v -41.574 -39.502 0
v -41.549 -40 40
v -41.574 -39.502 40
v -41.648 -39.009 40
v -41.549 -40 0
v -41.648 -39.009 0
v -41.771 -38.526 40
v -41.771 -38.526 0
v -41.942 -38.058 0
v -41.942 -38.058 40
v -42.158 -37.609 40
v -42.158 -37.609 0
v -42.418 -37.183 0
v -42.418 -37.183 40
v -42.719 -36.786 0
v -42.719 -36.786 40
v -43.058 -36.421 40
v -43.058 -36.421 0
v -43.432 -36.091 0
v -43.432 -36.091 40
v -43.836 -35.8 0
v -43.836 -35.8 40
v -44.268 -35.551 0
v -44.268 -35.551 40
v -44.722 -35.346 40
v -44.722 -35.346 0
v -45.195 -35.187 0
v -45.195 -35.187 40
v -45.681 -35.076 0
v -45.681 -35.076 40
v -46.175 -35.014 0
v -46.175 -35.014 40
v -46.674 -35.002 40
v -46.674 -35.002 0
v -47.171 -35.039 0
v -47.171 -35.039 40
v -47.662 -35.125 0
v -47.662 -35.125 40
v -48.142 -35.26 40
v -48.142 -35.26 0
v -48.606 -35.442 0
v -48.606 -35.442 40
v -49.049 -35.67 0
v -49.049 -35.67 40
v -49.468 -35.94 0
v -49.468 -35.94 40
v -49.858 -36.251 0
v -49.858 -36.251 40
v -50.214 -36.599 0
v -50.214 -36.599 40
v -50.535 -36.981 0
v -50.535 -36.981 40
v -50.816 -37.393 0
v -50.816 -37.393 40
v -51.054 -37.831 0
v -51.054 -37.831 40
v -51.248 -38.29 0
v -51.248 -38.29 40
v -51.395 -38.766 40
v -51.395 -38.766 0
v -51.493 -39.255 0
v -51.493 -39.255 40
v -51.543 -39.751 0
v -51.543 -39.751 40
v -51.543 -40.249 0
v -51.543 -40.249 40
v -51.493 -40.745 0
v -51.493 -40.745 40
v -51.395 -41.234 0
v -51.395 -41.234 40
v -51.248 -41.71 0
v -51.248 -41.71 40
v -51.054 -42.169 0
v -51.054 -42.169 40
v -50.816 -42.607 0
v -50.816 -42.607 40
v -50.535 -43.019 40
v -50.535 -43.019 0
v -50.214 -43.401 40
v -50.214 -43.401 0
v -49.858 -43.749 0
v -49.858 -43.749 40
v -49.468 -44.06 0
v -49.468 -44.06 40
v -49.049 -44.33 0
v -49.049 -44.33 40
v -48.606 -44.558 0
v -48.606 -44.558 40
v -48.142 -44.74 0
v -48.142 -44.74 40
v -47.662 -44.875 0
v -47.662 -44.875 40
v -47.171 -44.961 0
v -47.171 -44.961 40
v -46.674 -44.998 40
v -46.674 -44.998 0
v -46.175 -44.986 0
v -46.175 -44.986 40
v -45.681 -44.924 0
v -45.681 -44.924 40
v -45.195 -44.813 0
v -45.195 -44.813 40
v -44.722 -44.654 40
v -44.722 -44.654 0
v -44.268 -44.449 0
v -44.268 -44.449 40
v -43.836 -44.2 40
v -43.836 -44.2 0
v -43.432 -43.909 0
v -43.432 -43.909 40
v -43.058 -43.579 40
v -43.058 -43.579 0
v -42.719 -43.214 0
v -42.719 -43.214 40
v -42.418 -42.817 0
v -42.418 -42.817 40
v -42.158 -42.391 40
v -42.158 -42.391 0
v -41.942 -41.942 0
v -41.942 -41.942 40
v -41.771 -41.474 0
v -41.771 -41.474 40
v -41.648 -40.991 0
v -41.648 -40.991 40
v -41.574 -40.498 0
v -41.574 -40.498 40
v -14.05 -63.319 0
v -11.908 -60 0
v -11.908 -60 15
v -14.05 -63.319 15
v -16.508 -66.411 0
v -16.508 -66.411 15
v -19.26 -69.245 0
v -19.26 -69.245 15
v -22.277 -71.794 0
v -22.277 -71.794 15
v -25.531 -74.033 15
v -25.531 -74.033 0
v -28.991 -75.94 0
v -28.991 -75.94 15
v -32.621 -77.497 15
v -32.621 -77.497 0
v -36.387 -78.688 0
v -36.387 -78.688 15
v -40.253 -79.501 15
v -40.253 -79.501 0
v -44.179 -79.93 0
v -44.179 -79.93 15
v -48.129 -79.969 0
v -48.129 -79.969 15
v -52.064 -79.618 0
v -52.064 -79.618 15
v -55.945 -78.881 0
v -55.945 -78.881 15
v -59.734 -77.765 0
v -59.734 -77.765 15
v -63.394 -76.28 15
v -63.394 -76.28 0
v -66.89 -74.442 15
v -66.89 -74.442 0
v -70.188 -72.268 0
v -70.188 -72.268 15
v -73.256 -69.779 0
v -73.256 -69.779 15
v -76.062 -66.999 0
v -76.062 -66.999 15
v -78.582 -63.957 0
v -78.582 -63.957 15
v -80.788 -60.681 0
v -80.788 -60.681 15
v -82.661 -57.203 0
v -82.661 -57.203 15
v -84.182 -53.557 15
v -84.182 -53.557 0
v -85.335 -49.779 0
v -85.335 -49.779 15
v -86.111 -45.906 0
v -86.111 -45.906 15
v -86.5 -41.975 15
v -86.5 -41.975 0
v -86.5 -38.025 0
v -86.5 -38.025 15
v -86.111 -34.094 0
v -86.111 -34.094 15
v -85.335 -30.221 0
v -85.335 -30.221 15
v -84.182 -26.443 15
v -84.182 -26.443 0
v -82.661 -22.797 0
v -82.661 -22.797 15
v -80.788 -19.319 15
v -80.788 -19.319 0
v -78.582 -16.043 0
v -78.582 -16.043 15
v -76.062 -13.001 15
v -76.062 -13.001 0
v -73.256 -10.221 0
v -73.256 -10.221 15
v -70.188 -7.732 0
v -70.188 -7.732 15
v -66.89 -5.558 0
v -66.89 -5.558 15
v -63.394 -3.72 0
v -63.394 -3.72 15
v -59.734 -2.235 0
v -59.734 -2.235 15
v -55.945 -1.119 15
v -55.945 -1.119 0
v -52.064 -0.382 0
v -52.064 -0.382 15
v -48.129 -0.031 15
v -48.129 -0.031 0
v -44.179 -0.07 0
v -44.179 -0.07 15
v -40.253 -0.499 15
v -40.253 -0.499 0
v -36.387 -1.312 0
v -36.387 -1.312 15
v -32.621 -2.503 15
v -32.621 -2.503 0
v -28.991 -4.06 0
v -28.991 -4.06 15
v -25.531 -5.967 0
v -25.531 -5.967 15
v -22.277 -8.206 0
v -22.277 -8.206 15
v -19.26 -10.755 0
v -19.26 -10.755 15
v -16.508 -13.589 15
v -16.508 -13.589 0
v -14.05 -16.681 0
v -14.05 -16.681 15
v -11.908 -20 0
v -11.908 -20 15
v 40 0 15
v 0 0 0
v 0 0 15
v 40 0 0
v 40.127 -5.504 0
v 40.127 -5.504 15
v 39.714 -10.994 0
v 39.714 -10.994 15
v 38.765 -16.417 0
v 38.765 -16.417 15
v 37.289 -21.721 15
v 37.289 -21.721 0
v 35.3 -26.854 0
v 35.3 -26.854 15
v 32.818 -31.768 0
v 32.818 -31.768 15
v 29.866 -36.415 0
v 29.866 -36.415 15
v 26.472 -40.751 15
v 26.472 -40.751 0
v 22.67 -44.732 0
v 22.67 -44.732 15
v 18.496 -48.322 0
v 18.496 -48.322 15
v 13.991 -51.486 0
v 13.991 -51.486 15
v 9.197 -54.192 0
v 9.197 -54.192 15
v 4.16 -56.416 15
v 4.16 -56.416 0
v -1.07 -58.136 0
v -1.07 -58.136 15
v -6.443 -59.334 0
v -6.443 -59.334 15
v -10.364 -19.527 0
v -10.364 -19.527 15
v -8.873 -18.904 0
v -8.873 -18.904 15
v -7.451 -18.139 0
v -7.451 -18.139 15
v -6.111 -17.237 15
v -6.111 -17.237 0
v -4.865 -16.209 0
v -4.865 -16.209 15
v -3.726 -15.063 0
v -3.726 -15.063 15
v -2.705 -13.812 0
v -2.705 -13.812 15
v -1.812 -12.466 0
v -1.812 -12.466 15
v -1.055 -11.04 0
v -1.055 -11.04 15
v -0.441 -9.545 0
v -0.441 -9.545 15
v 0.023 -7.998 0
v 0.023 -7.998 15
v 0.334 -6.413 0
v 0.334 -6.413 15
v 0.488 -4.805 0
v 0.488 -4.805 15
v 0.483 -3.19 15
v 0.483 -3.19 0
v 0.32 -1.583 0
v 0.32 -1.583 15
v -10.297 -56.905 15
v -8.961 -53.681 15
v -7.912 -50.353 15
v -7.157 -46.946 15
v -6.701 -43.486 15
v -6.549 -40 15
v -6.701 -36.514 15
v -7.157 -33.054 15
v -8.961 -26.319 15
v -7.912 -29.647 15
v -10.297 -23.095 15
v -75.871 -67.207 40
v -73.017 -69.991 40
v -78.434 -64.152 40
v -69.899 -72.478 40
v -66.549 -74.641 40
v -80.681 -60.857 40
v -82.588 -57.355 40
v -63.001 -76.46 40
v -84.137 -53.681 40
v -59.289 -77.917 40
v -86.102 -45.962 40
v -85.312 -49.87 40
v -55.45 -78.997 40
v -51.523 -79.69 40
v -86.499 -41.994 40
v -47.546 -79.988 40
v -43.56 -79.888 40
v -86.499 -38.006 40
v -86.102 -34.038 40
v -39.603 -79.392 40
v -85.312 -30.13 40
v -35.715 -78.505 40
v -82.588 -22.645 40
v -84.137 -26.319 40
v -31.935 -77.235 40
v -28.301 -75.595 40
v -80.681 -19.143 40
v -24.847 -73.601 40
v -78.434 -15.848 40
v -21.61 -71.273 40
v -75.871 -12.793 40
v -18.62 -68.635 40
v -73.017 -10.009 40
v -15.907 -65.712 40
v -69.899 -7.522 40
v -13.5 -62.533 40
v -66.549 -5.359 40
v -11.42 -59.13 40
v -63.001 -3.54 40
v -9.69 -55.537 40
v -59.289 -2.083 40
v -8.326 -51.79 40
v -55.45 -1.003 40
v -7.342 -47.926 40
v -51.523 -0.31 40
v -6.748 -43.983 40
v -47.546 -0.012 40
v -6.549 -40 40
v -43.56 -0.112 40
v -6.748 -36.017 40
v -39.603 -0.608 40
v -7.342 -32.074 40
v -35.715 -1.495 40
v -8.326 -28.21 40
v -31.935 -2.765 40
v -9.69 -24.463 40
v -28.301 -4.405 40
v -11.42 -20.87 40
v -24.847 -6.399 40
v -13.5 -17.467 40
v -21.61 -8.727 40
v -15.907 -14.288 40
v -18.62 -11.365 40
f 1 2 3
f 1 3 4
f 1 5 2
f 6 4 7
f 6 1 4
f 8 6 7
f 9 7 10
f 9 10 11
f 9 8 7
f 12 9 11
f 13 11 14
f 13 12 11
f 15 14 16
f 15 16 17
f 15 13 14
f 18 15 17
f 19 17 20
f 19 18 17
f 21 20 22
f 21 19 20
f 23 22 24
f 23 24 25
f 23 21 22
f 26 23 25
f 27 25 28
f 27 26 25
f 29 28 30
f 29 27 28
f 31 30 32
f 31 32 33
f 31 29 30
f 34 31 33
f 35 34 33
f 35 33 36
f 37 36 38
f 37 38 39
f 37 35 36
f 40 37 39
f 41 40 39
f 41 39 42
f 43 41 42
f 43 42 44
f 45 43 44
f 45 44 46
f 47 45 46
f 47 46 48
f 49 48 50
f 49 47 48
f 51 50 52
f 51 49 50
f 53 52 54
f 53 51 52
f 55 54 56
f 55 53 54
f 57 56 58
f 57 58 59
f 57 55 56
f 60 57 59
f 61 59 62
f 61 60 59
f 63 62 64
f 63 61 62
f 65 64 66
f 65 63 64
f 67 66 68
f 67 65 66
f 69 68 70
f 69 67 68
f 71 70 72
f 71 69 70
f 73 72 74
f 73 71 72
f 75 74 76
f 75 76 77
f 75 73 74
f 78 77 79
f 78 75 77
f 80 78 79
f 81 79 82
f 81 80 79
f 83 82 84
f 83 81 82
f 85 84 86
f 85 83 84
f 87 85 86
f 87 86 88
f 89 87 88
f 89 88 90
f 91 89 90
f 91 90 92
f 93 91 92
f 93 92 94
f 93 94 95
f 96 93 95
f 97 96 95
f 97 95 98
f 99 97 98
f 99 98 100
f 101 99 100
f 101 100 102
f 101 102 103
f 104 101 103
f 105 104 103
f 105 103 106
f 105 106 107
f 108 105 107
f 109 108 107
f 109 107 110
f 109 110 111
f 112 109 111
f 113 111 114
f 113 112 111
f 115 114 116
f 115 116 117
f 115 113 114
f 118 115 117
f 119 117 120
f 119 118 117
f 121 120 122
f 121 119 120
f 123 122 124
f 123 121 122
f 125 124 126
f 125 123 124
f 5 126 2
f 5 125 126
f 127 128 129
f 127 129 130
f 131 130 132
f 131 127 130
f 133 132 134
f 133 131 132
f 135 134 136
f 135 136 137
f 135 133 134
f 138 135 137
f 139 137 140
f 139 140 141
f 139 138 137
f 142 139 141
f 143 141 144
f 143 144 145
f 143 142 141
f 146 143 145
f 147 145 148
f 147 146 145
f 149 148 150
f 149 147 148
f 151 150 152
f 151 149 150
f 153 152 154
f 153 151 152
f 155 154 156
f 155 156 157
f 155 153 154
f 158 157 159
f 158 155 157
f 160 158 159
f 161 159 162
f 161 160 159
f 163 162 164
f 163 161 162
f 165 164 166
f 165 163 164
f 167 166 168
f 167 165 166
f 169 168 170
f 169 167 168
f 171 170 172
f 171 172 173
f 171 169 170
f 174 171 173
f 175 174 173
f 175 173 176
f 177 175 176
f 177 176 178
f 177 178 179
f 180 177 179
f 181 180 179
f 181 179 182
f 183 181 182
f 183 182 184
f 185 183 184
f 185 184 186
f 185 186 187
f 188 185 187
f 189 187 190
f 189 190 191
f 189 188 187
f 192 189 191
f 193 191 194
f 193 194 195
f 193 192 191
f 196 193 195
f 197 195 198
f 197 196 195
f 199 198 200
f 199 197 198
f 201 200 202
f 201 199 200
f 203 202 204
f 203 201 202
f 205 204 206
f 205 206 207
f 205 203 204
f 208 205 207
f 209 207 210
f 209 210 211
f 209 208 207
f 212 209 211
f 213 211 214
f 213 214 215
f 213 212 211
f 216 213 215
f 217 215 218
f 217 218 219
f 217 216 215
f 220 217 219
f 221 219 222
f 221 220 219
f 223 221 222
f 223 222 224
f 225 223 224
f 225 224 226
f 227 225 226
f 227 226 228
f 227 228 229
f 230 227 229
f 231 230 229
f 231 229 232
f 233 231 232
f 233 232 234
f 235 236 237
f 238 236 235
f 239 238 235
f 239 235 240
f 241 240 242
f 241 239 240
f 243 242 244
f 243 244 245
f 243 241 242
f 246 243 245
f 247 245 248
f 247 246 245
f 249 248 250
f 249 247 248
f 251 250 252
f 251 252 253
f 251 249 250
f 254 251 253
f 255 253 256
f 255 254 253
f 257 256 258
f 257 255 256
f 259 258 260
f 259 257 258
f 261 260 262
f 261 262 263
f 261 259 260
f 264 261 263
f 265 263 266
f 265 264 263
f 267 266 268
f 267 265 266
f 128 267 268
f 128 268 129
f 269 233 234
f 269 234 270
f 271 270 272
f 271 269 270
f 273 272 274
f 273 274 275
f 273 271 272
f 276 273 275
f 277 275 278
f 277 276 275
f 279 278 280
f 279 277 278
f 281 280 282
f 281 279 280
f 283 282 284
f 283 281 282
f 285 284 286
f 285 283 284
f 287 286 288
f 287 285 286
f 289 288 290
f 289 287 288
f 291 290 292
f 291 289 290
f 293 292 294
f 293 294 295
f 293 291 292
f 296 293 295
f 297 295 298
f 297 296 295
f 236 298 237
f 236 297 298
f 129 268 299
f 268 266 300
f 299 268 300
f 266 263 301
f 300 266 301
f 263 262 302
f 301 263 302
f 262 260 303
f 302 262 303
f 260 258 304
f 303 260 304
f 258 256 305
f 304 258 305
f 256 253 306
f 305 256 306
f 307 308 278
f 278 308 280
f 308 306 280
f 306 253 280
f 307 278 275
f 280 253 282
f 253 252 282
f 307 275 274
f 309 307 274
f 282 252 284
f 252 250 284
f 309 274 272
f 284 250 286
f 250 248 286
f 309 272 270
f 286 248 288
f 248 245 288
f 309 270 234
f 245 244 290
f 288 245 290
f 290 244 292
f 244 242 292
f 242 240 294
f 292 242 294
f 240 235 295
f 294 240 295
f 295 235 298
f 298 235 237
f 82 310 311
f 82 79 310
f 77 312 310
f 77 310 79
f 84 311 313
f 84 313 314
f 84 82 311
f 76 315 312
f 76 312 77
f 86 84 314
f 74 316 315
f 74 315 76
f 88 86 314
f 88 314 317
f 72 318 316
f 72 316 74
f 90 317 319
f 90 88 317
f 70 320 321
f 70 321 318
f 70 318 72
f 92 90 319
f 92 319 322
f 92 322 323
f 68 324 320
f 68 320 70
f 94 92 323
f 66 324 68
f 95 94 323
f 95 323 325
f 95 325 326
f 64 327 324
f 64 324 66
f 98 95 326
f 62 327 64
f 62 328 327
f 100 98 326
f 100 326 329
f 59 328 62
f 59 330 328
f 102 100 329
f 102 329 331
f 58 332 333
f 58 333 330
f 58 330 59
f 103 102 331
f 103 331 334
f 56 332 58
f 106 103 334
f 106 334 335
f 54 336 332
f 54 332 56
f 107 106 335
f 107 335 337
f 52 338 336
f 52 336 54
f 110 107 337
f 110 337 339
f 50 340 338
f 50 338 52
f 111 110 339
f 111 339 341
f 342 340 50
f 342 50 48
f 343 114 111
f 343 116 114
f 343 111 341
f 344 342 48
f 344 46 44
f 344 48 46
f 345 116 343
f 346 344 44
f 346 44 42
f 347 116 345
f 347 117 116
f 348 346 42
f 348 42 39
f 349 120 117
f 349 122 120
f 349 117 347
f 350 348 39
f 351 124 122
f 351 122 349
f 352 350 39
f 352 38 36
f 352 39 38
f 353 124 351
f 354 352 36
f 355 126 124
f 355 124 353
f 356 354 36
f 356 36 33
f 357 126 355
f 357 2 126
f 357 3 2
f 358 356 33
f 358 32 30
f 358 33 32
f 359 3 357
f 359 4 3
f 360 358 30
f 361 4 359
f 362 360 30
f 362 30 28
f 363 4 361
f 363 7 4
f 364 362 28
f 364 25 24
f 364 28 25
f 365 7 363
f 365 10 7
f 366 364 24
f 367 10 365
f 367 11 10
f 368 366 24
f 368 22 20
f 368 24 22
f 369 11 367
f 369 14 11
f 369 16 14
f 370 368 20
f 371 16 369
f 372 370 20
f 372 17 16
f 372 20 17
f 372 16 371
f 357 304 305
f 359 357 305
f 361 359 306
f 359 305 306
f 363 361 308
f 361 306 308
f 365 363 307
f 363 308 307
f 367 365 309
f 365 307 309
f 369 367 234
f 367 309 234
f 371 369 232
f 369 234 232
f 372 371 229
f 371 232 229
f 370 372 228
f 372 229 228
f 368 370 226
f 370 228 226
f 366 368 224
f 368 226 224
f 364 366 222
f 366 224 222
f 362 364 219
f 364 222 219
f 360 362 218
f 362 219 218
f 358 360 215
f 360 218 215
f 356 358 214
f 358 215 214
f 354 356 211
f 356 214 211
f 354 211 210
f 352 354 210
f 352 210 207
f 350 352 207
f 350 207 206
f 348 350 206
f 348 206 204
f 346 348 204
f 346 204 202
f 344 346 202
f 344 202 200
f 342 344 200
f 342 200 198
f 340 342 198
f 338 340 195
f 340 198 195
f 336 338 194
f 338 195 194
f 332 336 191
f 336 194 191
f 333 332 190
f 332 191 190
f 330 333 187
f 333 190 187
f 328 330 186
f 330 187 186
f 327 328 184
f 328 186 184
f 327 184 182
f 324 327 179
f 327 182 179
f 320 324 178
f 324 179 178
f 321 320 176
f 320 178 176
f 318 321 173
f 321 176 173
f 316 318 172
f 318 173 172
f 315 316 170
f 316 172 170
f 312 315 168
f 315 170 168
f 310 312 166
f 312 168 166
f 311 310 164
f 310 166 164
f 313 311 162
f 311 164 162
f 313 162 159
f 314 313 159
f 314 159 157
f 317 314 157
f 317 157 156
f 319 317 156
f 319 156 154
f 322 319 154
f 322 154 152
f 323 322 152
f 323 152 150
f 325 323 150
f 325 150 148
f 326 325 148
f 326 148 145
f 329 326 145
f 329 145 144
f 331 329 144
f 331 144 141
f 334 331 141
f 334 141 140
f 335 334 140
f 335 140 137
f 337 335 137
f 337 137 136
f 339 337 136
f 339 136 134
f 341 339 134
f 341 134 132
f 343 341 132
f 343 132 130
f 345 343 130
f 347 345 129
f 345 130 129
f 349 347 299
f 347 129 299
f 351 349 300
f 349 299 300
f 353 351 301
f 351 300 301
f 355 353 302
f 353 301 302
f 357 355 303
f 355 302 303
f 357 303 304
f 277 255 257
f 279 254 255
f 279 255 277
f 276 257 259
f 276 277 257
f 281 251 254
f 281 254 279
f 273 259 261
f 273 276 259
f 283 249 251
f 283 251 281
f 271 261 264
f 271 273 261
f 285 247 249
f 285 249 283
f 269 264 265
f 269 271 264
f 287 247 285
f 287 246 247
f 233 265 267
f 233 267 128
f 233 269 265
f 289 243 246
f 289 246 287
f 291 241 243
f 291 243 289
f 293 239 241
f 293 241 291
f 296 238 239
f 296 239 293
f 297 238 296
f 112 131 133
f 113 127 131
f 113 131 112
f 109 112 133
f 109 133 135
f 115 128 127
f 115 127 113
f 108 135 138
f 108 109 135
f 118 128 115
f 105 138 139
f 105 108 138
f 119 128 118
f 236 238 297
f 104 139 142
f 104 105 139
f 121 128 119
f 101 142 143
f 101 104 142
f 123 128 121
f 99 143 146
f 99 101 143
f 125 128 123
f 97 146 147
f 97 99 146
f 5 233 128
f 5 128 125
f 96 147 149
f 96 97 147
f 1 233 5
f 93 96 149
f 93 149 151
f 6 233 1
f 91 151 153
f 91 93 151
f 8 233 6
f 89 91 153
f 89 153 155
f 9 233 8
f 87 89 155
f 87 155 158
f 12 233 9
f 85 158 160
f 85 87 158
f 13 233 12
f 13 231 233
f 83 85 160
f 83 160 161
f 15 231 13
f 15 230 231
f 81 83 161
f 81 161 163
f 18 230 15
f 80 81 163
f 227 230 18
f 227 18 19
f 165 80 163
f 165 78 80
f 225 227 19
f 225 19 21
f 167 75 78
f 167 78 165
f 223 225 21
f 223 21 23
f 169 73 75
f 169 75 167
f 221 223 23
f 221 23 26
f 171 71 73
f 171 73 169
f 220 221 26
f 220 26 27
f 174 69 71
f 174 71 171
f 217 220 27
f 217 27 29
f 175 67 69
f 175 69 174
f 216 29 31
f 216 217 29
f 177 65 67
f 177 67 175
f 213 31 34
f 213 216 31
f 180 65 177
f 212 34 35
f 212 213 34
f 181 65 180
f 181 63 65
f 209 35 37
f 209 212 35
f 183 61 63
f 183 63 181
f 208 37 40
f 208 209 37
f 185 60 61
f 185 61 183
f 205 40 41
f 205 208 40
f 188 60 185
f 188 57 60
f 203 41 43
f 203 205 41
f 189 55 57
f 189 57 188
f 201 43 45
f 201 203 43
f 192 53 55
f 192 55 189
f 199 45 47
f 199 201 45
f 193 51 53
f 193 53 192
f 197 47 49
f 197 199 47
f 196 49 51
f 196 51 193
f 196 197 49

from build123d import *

# Parameters (mm, degrees)
SKETCH1_R           = 5
BOSS_EXTRUDE1_DEPTH = 15
SKETCH5_R           = 40
SKETCH5_R_2         = 5
BOSS_EXTRUDE2_DEPTH = 25


with BuildPart() as part:
    # Sketch1 → Boss-Extrude1 (new body)
    with BuildSketch(Plane.XY):
        with BuildLine():
            Line((0, 0), (40, 0))
            ThreePointArc((40, 0), (26.472356234, -40.750519772), (-11.908101275, -60))
            ThreePointArc((-11.908101275, -60), (-86.549117426, -40), (-11.908101275, -20))
            ThreePointArc((-11.908101275, -20), (-1.811915014, -12.466248525), (0, 0))
        make_face()
        with Locations((-46.549117426, -40)):
            Circle(SKETCH1_R, mode=Mode.SUBTRACT)
    extrude(amount=BOSS_EXTRUDE1_DEPTH)

    # Sketch5 → Boss-Extrude2 (add)
    with BuildSketch(Plane.XY.offset(15)):
        with Locations((-46.549117426, -40)):
            Circle(SKETCH5_R)
        with Locations((-46.549117426, -40)):
            Circle(SKETCH5_R_2, mode=Mode.SUBTRACT)
    extrude(amount=BOSS_EXTRUDE2_DEPTH)


solid = part.part
